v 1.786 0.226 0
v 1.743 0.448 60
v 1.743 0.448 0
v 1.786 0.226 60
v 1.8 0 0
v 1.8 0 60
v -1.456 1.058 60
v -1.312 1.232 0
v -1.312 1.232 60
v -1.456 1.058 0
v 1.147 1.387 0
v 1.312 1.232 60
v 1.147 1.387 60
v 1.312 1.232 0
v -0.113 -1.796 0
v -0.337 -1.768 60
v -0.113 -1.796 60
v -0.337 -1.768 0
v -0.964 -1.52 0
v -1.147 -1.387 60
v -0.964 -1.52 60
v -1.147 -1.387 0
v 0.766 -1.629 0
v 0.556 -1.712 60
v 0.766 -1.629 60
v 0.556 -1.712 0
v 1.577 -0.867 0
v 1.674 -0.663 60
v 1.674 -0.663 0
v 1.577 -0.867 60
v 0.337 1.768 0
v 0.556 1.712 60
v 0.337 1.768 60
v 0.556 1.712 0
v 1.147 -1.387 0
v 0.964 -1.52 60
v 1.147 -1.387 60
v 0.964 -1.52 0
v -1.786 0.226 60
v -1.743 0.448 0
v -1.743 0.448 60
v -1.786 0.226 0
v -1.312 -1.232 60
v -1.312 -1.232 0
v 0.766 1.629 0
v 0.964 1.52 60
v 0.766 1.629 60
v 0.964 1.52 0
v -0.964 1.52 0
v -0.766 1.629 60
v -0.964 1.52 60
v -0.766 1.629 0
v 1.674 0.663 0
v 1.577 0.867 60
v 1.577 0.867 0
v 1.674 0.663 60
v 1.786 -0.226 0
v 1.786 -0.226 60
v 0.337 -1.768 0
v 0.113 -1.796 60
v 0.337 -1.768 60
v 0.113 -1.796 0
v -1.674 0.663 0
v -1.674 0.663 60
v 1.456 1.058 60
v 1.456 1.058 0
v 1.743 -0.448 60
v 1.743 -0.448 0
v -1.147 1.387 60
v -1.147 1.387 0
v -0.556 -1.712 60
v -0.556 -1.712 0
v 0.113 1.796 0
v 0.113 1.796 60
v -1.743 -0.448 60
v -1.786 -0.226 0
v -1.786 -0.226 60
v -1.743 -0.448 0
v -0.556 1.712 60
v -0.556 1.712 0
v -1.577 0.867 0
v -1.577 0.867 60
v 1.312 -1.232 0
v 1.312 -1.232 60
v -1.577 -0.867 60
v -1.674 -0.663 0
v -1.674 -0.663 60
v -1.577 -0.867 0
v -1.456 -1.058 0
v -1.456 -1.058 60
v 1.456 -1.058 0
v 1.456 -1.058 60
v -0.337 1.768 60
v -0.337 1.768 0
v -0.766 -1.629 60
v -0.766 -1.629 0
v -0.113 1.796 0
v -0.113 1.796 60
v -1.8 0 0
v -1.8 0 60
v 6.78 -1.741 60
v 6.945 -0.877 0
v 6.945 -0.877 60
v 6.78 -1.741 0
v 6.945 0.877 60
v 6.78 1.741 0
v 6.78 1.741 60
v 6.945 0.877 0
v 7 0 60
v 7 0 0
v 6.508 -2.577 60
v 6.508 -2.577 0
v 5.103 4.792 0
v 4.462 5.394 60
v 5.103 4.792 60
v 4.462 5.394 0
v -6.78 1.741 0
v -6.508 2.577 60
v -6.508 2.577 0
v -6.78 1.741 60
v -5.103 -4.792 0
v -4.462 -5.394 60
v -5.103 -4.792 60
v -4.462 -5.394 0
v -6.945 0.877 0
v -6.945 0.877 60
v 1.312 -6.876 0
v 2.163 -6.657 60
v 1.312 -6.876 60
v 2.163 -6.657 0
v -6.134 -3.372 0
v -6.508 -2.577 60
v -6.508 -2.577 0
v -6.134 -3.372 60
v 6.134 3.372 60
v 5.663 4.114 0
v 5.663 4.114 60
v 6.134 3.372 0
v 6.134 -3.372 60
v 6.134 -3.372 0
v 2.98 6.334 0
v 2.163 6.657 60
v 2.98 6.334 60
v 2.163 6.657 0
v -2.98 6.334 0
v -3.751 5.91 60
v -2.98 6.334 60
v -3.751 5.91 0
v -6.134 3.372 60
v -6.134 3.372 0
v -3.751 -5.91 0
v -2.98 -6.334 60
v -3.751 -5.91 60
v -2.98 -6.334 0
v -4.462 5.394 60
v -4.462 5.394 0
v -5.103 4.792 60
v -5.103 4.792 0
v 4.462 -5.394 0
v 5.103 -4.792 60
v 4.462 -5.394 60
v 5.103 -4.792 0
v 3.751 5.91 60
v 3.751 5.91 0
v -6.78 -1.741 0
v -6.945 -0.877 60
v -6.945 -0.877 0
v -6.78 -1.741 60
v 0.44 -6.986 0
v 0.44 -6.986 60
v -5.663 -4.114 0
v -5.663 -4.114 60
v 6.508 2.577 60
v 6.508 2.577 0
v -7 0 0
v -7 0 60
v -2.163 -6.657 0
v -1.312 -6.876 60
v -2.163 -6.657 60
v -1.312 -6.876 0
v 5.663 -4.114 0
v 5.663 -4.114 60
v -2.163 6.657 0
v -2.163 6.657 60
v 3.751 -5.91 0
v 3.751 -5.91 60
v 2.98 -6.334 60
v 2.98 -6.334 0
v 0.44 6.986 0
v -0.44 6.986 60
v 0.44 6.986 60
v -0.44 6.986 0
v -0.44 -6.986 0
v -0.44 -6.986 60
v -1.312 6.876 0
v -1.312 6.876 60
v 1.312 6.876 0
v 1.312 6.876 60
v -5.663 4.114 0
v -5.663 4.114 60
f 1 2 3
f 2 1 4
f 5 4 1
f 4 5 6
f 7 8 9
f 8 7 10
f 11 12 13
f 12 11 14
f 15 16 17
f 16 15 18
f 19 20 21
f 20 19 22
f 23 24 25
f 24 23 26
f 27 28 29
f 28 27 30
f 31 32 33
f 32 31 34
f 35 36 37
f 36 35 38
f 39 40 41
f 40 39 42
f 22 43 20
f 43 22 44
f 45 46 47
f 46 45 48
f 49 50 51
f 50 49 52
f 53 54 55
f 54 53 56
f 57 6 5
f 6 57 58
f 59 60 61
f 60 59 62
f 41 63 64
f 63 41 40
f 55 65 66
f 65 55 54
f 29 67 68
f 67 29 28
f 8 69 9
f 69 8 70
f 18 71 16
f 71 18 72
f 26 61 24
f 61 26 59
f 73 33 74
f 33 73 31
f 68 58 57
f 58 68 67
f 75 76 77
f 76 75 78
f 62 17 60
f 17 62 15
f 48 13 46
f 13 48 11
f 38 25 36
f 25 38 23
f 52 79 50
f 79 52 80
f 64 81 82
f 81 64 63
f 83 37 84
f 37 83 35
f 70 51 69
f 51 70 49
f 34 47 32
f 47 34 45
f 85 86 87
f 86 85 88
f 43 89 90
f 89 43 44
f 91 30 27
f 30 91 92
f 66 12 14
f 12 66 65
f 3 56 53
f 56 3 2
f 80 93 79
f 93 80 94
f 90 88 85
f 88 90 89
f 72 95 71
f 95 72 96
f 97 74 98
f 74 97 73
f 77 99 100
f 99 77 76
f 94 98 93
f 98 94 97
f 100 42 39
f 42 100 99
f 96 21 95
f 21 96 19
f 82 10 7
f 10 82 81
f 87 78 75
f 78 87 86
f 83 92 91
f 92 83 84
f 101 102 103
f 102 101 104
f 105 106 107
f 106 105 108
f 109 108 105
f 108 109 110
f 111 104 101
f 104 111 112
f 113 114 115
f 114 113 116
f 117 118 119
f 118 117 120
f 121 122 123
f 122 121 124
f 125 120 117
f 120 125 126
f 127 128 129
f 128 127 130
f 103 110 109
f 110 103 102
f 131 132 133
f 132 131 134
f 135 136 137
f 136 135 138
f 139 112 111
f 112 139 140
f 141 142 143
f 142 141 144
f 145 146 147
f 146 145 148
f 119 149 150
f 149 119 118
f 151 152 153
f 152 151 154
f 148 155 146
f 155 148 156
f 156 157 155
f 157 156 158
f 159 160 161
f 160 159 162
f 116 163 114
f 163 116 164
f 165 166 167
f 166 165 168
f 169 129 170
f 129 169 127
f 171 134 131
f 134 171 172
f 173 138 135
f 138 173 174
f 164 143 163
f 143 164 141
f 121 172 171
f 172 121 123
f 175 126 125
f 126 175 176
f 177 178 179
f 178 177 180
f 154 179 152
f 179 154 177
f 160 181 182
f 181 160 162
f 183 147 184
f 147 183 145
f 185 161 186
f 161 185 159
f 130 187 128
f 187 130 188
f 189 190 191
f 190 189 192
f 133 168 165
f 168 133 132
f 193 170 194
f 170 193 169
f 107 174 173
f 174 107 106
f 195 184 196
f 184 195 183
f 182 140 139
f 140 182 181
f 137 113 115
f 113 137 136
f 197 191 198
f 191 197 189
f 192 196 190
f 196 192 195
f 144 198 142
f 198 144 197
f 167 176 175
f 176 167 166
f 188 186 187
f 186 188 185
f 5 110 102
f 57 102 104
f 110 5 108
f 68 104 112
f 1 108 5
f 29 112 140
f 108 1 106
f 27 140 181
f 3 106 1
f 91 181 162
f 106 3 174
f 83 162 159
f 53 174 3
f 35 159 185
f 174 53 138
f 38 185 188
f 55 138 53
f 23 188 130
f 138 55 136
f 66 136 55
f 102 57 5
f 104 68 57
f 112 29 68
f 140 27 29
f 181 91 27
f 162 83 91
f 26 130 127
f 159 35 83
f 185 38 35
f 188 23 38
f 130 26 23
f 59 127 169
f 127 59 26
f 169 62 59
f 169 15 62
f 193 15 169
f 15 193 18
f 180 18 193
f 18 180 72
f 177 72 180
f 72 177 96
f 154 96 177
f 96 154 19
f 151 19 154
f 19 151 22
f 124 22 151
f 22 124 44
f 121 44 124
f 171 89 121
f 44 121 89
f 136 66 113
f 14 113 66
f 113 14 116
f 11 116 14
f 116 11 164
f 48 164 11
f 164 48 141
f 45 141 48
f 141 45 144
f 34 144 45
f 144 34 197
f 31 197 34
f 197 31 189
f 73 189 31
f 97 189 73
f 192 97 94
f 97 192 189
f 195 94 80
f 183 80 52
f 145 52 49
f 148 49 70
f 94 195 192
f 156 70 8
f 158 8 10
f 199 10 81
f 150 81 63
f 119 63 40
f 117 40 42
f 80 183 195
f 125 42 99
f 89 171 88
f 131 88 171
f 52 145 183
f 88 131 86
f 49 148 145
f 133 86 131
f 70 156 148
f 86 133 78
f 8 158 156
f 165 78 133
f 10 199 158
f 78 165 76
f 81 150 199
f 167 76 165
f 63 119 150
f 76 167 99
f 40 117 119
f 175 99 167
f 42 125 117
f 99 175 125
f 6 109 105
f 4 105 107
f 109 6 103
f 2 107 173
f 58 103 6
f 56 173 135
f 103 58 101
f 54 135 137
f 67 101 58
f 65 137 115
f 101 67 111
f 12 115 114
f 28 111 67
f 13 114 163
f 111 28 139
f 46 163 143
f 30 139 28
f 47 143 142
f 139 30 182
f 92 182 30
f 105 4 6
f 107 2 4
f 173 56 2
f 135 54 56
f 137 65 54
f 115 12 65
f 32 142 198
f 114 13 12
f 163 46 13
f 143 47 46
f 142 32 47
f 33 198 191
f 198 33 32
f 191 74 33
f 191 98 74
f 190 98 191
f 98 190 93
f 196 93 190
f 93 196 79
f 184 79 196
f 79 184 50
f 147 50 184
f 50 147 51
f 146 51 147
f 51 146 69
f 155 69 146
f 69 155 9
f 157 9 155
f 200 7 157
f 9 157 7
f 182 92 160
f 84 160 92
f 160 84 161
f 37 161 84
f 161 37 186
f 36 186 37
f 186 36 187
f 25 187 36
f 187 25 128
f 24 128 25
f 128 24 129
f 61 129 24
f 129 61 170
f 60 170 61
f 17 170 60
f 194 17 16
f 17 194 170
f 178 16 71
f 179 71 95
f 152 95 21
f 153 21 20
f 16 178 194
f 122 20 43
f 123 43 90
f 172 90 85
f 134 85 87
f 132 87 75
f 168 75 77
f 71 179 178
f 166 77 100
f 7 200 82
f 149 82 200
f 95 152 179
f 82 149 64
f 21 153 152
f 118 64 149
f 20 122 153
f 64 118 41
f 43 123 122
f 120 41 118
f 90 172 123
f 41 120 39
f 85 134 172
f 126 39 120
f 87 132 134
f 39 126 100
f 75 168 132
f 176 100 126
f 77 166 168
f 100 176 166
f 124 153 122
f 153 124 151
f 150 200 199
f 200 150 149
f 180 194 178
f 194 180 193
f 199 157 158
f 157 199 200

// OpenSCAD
$fn = 50;


difference() {
	union() {
		cylinder(h = 60, r = 7.0000000000);
	}
	union() {
		translate(v = [0.0000000000, 0.0000000000, -100.0000000000]) {
			cylinder(h = 200, r = 1.8000000000);
		}
		cylinder(h = 60, r = 1.8000000000);
		cylinder(h = 60, r = 1.8000000000);
		cylinder(h = 60, r = 1.8000000000);
	}
}
